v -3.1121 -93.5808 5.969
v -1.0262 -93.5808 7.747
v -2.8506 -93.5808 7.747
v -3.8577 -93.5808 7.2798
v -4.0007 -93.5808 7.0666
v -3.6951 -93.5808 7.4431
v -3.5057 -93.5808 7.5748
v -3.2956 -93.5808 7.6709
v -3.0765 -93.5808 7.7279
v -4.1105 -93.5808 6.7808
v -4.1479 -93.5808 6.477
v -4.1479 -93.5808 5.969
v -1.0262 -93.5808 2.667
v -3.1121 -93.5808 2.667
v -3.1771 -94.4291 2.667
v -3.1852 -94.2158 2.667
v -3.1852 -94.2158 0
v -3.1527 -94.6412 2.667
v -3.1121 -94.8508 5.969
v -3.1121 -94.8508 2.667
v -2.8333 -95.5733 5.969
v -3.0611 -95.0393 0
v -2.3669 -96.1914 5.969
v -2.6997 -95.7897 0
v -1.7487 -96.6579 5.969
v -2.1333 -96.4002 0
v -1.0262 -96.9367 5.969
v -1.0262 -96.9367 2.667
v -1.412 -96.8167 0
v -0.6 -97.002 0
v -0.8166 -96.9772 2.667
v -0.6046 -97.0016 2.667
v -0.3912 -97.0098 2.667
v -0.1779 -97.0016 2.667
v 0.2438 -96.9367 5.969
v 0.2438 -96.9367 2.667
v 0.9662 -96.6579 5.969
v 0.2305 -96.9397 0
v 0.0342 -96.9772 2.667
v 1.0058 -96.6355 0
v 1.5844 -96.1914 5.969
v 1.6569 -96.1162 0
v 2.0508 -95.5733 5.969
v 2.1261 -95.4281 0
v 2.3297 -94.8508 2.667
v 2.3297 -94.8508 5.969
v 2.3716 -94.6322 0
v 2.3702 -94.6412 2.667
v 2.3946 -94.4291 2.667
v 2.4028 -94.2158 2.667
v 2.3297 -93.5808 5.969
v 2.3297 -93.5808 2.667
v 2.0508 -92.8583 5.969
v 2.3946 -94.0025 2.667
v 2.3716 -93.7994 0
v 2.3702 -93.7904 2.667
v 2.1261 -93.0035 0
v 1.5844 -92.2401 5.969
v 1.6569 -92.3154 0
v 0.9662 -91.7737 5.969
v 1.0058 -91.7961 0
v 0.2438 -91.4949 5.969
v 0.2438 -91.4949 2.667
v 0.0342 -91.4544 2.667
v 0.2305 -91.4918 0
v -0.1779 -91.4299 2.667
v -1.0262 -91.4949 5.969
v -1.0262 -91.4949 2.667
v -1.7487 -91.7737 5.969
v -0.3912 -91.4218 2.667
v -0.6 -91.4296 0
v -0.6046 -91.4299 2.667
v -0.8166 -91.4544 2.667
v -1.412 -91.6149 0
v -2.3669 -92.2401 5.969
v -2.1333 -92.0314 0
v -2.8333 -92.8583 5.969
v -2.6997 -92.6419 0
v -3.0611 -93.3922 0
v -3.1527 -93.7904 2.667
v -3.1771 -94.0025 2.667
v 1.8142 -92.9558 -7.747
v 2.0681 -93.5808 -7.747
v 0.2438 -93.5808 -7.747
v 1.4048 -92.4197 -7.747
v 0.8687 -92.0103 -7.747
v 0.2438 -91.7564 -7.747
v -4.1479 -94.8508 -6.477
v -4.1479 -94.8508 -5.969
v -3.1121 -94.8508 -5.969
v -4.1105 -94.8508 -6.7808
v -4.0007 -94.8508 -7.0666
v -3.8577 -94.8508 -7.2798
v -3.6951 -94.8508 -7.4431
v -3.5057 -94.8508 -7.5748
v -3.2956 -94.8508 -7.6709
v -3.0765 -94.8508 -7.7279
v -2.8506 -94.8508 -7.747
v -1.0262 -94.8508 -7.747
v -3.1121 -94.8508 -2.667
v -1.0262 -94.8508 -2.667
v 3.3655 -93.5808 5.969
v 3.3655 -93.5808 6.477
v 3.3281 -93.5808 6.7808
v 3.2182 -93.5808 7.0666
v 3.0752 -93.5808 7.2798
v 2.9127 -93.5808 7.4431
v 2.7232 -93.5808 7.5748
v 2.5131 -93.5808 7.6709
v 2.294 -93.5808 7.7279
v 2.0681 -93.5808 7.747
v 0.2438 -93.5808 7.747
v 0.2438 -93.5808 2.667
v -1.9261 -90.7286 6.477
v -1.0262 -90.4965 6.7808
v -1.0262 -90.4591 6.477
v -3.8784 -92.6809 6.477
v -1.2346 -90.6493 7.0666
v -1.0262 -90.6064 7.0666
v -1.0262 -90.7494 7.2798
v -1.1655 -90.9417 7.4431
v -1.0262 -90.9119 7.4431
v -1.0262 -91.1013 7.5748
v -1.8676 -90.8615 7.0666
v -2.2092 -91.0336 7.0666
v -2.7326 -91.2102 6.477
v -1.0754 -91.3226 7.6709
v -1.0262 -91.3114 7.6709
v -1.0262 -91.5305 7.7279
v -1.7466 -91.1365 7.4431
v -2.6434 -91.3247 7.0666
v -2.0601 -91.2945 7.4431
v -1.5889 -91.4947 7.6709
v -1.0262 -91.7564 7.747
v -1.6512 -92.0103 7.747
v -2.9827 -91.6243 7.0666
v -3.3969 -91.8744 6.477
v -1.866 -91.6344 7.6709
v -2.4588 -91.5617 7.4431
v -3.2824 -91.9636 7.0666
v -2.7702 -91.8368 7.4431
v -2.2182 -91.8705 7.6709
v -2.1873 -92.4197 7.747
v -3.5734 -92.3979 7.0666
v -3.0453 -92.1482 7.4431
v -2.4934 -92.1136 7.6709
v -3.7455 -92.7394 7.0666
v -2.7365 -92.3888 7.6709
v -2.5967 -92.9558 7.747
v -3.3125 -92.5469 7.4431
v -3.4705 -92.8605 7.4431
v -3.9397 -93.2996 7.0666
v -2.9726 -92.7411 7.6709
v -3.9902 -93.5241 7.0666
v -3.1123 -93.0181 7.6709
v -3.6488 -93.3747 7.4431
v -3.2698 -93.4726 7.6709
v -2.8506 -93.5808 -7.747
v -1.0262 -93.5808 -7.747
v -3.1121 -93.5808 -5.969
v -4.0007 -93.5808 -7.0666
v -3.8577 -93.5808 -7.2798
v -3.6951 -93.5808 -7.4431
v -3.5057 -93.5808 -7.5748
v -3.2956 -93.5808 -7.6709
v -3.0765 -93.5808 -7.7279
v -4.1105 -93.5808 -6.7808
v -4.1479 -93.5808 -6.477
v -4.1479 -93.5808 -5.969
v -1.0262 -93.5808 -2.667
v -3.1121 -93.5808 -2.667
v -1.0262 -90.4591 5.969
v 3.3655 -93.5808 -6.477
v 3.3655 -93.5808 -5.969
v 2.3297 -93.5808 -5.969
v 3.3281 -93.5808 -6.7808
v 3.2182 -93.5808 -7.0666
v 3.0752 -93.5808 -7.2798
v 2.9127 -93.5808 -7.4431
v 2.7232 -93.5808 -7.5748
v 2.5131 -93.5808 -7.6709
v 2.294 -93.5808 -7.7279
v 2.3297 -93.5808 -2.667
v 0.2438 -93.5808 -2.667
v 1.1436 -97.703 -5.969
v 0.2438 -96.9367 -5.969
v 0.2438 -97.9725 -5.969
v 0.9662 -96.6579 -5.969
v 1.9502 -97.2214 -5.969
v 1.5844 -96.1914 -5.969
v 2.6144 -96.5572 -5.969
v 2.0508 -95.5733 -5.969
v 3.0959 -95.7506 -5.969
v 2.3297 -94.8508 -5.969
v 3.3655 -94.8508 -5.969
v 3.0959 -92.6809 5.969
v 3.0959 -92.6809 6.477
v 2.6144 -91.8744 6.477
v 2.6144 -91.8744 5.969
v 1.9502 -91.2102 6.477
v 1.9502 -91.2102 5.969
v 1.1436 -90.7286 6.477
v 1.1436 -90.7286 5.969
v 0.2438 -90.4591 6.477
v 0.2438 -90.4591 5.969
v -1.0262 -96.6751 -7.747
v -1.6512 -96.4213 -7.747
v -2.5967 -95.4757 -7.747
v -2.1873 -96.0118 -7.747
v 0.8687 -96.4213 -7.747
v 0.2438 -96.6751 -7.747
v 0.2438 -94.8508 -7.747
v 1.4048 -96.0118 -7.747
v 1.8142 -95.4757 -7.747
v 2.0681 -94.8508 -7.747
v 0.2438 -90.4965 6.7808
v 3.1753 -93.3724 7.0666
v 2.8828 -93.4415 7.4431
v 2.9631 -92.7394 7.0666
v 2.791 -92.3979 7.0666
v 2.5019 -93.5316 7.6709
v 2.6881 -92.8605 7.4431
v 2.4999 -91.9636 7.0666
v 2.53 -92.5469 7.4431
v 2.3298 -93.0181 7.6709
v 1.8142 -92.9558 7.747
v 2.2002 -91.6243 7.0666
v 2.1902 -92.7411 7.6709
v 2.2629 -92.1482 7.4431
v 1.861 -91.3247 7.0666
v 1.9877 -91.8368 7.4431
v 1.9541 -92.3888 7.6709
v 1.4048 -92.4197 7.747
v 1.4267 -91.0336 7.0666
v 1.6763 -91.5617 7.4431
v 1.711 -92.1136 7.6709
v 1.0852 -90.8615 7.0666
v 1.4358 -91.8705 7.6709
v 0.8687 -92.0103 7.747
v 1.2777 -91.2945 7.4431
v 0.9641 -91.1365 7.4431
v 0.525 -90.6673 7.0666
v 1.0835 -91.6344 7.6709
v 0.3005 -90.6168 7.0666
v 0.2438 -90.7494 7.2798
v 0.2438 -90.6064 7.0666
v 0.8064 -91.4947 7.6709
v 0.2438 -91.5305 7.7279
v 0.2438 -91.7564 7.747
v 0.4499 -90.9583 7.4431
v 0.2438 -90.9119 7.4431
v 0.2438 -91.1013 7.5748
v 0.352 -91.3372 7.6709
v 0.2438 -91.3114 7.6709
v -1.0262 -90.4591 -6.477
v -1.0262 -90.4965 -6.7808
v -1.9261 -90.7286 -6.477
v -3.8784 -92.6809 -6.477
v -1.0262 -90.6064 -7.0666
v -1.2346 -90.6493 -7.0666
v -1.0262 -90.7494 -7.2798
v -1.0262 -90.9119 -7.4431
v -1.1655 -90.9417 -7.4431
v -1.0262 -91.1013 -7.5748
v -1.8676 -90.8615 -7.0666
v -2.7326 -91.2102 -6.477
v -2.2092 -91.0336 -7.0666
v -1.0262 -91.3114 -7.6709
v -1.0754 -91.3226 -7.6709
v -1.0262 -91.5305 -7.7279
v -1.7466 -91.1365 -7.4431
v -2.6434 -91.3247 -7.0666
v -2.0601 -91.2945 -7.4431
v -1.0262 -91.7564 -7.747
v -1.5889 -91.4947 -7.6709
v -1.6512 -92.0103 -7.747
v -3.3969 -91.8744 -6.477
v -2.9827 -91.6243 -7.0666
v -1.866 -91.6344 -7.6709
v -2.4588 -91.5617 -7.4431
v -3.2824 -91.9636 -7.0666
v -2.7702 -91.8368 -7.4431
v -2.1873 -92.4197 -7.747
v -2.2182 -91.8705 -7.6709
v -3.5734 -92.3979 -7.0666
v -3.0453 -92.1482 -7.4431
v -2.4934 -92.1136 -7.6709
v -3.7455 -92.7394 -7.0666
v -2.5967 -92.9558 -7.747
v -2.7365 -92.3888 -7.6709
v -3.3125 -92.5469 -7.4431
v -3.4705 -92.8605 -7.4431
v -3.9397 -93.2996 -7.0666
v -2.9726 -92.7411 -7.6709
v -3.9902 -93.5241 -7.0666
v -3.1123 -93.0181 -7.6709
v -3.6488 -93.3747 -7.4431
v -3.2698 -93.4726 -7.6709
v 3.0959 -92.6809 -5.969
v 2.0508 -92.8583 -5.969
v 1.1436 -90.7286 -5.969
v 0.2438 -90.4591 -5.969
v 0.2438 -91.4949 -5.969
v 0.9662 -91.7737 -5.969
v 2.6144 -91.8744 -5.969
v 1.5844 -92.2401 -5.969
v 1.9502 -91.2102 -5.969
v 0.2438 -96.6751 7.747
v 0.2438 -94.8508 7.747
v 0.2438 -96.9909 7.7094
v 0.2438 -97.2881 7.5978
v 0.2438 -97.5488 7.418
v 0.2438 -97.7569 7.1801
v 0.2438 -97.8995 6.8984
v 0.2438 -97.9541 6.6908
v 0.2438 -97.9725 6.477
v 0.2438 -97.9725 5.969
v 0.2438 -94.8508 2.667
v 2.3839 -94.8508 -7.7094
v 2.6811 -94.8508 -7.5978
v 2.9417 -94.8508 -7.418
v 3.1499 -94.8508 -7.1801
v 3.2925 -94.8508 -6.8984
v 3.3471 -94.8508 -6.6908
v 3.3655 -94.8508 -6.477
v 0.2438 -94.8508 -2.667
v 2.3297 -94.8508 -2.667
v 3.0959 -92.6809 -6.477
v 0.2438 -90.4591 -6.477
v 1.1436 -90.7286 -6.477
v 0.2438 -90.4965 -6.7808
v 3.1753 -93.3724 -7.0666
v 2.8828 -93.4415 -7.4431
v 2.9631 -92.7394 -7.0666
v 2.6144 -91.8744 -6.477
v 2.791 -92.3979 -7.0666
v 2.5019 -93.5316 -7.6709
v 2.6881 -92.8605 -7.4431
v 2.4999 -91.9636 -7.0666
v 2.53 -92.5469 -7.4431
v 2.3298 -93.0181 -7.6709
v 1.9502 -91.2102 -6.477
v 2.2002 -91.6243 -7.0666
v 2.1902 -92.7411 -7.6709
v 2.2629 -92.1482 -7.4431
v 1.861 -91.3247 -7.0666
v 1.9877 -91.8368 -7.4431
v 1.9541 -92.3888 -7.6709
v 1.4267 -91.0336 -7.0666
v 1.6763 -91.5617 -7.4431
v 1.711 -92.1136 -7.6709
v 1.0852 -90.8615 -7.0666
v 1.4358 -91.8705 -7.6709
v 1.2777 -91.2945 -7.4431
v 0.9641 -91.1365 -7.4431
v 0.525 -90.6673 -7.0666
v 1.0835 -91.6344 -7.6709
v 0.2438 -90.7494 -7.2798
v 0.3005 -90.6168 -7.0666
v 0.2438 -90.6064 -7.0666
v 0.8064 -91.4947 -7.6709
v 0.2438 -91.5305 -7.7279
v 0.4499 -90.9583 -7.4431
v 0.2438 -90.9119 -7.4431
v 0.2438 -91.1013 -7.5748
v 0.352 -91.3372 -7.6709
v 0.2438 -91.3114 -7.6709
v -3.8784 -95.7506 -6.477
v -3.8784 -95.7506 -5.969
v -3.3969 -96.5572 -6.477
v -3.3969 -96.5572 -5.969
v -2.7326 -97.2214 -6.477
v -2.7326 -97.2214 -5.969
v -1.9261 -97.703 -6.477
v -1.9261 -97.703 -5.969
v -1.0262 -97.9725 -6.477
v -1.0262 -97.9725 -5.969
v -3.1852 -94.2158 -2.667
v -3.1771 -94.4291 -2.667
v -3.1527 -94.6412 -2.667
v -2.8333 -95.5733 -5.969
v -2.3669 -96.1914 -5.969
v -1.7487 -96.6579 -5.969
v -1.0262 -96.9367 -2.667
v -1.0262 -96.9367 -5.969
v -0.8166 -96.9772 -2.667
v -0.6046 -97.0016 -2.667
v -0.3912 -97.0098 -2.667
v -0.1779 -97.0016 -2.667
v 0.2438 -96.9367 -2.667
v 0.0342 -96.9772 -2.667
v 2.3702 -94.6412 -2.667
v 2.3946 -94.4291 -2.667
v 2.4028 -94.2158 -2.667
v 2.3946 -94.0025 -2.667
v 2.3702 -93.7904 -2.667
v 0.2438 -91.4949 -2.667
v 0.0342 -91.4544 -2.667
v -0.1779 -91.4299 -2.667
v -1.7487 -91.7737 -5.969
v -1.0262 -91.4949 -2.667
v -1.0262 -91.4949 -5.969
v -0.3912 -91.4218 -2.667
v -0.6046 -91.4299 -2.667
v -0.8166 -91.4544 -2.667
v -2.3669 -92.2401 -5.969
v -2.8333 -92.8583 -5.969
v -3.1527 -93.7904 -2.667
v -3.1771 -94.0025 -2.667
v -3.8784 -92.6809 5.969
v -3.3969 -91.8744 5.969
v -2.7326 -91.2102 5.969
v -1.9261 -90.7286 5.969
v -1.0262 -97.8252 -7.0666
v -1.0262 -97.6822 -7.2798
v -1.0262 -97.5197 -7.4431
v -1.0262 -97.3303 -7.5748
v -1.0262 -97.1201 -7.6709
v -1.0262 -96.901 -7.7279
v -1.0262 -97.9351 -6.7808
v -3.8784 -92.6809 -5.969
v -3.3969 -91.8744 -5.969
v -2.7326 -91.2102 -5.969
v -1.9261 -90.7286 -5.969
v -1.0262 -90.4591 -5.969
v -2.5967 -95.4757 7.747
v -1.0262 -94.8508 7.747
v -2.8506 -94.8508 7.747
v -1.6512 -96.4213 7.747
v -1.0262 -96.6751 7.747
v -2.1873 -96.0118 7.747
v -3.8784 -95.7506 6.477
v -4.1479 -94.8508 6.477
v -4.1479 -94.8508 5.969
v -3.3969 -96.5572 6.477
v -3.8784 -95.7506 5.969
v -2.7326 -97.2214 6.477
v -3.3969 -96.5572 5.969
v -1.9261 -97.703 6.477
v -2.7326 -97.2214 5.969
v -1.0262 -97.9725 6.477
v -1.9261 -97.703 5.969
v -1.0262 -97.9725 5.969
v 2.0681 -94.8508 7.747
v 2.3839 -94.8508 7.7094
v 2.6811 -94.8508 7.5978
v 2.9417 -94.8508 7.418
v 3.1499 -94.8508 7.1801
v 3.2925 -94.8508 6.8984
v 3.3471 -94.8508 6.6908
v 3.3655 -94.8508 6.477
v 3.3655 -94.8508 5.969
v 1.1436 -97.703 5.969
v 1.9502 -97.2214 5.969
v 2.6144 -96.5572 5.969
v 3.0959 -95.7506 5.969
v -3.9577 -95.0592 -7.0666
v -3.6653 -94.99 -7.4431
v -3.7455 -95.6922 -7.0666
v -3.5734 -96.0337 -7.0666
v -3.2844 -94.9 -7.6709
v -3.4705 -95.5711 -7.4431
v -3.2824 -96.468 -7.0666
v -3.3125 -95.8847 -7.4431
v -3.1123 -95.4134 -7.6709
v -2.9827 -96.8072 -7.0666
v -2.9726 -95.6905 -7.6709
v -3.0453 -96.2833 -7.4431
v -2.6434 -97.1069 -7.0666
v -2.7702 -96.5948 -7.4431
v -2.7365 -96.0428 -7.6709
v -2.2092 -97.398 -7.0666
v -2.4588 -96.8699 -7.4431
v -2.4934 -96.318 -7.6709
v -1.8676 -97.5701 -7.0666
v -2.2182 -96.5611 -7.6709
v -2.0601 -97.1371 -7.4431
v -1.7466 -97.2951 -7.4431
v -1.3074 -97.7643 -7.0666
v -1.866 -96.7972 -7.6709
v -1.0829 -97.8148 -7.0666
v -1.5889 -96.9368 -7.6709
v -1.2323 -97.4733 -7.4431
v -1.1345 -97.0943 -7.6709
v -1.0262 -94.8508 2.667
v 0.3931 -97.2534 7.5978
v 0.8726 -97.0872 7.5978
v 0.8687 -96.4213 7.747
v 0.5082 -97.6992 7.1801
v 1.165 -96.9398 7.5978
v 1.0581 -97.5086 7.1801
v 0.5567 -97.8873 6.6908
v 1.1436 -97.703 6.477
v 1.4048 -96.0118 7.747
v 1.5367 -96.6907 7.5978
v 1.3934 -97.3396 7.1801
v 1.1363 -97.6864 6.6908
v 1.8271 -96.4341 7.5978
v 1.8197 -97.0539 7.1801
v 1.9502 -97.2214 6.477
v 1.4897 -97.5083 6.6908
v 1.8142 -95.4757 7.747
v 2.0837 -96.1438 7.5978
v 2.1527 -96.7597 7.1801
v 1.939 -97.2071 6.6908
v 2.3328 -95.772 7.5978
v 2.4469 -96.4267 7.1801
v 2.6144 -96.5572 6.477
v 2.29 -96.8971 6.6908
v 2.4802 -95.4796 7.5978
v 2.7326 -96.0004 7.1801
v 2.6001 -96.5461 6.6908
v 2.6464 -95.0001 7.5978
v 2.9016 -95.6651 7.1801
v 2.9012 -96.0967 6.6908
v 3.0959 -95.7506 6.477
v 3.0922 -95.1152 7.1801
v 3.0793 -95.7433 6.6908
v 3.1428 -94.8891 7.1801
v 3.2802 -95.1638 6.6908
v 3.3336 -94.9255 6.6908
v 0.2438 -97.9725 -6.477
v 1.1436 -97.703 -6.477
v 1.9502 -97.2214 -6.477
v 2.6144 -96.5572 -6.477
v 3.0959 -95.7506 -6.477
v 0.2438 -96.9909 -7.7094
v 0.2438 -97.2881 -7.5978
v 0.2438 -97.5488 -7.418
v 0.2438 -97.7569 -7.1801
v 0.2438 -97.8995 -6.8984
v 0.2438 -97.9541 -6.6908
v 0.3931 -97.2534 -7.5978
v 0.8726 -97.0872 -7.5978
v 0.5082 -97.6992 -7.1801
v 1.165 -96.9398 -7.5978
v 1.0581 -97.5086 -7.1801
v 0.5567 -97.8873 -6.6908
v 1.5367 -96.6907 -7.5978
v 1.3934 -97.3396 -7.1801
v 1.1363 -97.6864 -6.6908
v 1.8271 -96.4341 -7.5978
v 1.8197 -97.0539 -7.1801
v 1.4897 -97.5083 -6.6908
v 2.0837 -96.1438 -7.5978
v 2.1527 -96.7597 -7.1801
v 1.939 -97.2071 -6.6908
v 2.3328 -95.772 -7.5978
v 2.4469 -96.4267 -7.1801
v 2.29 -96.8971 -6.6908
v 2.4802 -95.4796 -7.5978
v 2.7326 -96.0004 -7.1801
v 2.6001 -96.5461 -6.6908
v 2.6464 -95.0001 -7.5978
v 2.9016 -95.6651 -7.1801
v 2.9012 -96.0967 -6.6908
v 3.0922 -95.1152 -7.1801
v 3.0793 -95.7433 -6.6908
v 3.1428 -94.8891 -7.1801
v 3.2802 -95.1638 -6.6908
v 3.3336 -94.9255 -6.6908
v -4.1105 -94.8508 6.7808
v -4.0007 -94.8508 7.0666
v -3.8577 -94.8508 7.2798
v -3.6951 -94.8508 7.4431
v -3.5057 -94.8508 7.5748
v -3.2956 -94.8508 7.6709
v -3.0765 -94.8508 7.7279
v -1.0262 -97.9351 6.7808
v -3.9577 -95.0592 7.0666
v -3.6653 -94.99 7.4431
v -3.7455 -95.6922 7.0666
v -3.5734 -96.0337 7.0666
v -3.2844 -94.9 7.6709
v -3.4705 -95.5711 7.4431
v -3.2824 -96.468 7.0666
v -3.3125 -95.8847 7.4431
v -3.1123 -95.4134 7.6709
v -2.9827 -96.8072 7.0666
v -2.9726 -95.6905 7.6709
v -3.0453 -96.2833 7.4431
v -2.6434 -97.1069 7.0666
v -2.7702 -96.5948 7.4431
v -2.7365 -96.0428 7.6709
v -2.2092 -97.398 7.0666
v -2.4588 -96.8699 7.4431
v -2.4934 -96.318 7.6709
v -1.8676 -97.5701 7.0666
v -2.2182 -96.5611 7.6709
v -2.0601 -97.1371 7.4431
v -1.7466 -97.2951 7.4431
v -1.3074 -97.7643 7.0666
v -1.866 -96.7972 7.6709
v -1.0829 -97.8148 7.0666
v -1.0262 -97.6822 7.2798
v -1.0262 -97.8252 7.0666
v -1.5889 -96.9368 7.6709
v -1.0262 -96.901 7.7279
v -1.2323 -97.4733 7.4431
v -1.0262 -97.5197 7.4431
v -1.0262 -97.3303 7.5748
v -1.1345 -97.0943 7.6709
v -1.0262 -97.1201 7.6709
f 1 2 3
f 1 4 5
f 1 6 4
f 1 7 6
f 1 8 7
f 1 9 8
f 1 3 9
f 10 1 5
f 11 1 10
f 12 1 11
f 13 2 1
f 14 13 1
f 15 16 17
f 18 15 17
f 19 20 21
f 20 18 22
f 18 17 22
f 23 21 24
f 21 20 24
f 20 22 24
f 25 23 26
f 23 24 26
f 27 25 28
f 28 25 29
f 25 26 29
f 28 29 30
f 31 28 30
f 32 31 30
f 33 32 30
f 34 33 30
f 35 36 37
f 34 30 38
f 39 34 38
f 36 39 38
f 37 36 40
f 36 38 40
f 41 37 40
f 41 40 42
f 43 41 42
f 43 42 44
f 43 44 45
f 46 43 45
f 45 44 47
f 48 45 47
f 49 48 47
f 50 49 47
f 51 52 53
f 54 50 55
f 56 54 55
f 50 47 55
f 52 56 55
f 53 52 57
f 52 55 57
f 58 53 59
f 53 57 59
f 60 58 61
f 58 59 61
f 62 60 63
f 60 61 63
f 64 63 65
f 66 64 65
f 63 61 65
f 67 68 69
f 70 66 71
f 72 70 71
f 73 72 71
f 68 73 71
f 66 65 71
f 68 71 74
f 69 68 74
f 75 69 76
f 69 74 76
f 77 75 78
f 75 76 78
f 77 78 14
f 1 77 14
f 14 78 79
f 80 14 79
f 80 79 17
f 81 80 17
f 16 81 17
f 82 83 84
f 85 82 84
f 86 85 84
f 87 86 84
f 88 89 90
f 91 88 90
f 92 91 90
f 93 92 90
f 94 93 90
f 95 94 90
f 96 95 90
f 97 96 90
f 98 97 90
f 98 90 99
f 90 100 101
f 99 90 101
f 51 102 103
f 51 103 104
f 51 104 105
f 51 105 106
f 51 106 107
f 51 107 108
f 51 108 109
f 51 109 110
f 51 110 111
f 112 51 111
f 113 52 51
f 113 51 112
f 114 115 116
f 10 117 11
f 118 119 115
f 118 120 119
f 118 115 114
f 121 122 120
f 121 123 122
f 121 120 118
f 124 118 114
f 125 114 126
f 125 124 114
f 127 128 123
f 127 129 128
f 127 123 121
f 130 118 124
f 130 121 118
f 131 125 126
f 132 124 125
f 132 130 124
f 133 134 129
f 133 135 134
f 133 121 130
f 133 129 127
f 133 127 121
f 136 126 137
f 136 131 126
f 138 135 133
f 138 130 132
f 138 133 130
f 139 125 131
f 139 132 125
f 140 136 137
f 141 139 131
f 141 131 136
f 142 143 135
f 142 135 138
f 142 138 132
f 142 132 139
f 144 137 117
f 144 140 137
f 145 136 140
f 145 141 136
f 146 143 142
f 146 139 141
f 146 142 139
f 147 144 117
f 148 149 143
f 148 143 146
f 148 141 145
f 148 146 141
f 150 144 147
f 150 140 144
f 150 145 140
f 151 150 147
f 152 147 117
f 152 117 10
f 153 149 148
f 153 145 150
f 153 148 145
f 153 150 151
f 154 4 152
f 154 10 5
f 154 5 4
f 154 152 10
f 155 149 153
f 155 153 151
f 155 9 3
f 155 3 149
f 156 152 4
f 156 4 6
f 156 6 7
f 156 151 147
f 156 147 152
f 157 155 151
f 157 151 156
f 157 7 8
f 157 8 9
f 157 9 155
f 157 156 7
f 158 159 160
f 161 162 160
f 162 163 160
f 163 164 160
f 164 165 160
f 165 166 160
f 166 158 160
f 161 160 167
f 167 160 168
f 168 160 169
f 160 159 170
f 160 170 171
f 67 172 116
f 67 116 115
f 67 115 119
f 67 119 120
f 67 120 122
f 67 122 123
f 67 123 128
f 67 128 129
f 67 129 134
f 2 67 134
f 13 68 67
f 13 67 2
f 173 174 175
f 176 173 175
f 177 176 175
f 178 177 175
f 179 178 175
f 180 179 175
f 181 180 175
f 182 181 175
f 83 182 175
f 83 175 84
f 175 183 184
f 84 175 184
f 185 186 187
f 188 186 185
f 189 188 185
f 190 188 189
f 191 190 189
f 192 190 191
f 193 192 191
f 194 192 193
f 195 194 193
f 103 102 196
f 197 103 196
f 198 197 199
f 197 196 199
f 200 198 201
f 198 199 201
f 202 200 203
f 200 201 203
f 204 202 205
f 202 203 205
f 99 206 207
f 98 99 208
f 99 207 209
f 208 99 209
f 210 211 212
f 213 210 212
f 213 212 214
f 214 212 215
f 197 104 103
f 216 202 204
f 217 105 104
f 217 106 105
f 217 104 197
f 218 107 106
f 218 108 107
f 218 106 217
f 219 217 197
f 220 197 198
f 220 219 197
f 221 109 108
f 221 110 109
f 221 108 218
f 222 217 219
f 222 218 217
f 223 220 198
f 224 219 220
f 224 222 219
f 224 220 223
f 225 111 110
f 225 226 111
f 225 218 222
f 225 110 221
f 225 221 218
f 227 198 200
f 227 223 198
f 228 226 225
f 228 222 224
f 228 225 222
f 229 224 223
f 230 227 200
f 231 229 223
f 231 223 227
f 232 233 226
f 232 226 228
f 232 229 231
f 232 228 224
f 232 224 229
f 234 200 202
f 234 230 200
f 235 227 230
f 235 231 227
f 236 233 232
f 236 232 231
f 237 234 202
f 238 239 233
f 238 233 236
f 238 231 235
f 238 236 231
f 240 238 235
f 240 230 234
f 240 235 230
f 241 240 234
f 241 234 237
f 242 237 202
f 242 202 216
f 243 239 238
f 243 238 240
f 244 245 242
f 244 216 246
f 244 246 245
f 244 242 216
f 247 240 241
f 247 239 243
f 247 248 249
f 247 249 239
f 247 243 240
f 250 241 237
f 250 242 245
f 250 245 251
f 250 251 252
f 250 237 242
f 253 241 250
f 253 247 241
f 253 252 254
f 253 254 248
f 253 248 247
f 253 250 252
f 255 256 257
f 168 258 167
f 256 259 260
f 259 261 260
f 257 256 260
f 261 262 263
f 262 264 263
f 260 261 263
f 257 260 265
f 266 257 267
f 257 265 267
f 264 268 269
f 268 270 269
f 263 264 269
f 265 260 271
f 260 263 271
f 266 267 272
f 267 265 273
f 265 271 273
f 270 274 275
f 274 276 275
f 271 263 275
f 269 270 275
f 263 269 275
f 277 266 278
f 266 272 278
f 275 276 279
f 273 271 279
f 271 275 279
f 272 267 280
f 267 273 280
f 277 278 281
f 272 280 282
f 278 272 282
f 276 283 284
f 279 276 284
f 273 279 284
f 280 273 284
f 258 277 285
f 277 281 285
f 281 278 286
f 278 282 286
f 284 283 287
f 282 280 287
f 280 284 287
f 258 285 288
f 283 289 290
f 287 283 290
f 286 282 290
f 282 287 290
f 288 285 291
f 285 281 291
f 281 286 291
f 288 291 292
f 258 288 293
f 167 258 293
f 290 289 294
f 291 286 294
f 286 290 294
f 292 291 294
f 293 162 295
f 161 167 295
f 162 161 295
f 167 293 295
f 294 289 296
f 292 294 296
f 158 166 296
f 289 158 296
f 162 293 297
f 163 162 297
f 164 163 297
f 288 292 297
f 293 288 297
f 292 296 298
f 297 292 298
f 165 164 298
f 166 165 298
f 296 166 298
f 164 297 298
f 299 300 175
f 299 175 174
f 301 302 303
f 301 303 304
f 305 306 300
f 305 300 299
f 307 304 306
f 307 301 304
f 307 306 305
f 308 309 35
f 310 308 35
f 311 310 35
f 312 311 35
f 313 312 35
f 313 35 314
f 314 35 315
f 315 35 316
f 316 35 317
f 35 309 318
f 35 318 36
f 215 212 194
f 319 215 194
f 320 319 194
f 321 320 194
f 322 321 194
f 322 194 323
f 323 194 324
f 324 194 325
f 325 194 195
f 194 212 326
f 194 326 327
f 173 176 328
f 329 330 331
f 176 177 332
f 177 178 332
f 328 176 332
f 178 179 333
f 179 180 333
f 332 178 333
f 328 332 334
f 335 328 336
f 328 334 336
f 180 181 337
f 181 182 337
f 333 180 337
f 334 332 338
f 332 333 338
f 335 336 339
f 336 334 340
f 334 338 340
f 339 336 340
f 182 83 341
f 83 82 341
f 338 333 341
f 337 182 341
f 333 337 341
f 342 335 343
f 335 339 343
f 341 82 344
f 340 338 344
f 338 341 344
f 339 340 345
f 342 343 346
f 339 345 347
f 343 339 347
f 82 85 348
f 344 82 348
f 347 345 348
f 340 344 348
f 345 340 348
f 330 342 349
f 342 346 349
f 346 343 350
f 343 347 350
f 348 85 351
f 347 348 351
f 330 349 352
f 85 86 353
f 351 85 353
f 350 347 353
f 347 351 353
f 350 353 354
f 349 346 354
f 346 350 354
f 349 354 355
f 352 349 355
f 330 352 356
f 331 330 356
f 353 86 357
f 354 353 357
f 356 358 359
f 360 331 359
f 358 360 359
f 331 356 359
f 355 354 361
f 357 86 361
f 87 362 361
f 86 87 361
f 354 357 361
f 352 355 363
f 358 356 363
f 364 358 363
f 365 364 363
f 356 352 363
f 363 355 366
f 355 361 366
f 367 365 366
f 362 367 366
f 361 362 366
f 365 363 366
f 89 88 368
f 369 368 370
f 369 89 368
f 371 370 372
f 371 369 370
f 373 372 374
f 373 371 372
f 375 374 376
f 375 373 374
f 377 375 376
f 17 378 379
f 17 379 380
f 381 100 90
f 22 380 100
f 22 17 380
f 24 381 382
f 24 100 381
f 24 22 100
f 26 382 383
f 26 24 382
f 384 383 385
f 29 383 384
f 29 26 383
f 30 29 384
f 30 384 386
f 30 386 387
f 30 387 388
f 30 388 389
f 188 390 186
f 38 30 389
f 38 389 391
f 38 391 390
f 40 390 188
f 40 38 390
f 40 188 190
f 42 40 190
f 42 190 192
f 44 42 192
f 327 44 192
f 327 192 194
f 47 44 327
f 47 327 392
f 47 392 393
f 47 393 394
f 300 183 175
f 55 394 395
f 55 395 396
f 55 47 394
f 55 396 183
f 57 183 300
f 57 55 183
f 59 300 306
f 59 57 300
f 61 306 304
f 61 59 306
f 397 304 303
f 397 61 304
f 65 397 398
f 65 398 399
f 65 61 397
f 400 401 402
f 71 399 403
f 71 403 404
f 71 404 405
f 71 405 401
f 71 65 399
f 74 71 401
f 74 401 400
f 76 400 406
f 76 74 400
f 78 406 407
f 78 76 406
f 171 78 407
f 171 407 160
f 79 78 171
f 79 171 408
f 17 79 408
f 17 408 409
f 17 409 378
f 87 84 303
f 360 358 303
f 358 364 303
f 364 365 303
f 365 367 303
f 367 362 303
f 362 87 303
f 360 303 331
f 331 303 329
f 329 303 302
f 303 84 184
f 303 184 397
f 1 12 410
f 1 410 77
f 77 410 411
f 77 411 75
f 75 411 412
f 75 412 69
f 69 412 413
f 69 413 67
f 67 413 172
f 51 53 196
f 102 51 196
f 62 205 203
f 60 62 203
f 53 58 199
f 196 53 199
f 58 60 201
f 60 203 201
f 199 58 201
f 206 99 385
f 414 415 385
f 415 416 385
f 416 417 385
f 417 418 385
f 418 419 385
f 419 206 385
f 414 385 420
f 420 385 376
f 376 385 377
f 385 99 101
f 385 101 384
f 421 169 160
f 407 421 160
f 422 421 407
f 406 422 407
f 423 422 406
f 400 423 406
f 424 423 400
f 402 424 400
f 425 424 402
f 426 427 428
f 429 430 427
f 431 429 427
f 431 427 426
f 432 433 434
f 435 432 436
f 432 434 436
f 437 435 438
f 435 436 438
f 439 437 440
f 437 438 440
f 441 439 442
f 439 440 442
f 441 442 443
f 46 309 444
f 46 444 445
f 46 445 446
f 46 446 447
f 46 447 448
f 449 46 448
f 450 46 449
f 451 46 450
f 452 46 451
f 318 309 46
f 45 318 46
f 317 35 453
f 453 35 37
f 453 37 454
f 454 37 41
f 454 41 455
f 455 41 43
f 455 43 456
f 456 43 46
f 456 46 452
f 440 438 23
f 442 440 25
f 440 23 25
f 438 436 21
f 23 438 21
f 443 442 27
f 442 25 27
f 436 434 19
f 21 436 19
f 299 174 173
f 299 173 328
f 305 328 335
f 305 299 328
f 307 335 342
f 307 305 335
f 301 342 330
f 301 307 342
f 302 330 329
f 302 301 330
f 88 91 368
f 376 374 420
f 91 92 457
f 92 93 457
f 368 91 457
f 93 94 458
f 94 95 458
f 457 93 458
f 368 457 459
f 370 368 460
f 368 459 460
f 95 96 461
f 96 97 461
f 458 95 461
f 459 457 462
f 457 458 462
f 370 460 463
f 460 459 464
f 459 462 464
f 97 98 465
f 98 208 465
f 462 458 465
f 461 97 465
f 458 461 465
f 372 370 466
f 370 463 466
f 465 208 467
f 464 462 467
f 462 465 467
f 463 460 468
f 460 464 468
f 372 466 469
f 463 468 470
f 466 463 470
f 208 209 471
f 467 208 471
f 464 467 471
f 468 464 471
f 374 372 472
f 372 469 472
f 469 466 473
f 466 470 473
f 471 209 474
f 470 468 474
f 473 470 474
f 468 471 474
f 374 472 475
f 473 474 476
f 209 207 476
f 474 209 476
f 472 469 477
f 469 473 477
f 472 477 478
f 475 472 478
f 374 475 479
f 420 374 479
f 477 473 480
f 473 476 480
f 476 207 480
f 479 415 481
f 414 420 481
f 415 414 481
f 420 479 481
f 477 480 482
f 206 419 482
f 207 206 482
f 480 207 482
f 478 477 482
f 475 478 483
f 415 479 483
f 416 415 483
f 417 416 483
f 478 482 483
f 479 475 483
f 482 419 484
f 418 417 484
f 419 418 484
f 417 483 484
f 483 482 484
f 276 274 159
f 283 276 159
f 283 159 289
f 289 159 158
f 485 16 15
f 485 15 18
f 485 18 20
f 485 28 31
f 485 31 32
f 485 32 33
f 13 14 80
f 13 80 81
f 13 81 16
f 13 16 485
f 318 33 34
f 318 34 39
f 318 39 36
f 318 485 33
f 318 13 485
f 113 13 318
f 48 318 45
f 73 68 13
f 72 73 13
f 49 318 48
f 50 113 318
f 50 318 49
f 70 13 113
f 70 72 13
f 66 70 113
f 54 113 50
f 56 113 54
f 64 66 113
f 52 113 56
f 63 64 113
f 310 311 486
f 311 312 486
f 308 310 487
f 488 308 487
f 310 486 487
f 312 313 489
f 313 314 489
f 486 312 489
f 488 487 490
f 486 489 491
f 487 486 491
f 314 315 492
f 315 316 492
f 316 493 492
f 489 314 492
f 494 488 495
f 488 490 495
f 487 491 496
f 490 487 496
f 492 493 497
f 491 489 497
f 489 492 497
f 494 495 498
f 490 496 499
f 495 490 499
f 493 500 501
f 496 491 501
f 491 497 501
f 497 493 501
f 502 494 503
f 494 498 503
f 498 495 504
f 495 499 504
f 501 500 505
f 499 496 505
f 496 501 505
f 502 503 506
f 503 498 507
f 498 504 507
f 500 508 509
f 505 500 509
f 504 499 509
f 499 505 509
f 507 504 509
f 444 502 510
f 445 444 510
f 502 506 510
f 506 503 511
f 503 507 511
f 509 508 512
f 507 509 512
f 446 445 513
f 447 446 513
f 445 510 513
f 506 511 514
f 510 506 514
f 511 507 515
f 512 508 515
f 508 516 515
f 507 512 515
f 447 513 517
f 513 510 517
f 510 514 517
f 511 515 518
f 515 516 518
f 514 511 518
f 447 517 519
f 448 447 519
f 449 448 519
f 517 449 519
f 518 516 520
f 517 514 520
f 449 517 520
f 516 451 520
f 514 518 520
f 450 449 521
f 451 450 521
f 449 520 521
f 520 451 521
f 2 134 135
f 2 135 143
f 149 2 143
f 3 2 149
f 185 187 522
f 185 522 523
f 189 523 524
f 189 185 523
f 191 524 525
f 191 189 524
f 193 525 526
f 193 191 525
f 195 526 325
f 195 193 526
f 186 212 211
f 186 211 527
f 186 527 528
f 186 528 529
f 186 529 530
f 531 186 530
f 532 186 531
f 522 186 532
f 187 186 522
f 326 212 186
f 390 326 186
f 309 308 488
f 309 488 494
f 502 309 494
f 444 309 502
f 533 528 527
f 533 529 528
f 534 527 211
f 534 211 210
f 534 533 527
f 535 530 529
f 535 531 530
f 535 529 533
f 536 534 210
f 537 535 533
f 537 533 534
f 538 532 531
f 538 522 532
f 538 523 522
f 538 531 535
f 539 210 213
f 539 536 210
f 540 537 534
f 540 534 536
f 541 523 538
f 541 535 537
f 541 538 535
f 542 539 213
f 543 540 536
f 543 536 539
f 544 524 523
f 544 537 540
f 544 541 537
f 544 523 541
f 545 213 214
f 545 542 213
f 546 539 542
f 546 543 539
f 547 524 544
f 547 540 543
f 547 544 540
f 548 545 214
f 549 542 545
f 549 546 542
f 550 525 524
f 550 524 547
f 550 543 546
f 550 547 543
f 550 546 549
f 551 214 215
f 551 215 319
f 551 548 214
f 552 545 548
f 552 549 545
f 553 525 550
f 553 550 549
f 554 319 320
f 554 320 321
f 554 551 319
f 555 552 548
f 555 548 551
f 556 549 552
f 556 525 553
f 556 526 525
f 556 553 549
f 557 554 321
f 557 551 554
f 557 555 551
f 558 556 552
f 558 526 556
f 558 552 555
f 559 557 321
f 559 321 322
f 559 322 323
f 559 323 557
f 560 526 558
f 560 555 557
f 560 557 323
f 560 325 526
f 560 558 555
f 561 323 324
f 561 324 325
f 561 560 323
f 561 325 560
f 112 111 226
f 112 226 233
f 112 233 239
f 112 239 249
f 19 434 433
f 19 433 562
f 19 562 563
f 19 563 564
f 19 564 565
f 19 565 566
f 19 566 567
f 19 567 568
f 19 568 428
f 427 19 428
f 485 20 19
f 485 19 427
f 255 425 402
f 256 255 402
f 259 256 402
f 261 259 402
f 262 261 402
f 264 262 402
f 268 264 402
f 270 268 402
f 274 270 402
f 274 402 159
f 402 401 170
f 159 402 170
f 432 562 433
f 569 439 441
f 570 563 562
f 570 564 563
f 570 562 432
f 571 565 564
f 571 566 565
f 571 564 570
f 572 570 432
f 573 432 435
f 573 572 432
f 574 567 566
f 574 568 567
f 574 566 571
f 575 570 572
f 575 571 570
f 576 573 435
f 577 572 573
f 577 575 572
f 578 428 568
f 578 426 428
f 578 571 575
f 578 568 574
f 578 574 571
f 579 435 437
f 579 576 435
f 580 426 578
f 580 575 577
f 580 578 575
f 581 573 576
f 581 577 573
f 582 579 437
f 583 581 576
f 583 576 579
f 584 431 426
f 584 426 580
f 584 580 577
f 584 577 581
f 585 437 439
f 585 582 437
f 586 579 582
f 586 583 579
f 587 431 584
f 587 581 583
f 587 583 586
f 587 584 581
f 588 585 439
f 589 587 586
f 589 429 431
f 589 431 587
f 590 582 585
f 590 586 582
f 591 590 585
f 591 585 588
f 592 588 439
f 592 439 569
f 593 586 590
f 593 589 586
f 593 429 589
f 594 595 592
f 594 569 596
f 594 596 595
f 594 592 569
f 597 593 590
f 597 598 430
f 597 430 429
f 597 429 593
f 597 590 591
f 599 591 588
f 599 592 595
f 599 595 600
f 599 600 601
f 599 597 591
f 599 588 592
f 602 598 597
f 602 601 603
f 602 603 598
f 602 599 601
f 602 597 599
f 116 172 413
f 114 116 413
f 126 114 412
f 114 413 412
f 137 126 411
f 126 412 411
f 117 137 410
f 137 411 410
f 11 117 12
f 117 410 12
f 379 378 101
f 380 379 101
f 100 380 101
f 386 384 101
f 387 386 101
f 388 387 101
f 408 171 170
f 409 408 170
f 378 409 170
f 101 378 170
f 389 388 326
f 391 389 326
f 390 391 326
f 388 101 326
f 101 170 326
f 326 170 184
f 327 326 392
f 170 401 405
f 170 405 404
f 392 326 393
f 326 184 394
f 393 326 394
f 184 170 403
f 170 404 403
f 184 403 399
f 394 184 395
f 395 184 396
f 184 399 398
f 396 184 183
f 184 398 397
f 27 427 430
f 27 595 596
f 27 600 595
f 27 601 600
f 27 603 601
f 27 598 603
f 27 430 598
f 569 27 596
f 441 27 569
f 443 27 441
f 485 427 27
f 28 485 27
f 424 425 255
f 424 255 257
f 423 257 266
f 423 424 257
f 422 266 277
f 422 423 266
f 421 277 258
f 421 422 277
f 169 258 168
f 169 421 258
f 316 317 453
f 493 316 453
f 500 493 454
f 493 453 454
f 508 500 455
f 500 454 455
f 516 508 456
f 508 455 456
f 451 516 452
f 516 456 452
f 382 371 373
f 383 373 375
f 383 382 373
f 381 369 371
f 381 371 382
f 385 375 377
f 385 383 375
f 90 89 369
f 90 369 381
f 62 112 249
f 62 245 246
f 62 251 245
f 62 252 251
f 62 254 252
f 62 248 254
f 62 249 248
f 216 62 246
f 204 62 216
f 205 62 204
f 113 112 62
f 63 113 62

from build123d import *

# Parameters (mm, degrees)
SKETCH1_R           = 2.794
BOSS_EXTRUDE1_DEPTH = 7.747
CUT_EXTRUDE1_START  = -5.08
SKETCH2_W           = 1.27
SKETCH2_H           = 1.27
CUT_EXTRUDE1_DEPTH  = 5.08
BOSS_EXTRUDE2_START = -1.778
BOSS_EXTRUDE2_DEPTH = 1.778
FILLET1_R           = 1.27


with BuildPart() as part:
    # Sketch1 → Boss-Extrude1 (new body)
    with BuildSketch(Plane.XY):
        with Locations(Location((-0.391227277, -94.215792273, 0), (0, 0, 180))):
            Circle(SKETCH1_R)
    extrude(amount=BOSS_EXTRUDE1_DEPTH)

    # Sketch2 → Cut-Extrude1 (cut)
    with BuildSketch(Plane.XY.offset(7.747).offset(CUT_EXTRUDE1_START)):
        with BuildLine():
            ThreePointArc((2.402772723, -94.215792273), (2.384433594, -93.896194512), (2.329656954, -93.580792273))
            Line((2.329656954, -93.580792273), (0.243772723, -93.580792273))
            Line((0.243772723, -93.580792273), (0.243772723, -94.850792273))
            Line((0.243772723, -94.850792273), (2.329656954, -94.850792273))
            ThreePointArc((2.329656954, -94.850792273), (2.384433594, -94.535390034), (2.402772723, -94.215792273))
        make_face()
        with BuildLine():
            Line((-1.026227277, -94.850792273), (-1.026227277, -93.580792273))
            Line((-1.026227277, -93.580792273), (-3.112111508, -93.580792273))
            ThreePointArc((-3.112111508, -93.580792273), (-3.166888148, -93.896194512), (-3.185227277, -94.215792273))
            ThreePointArc((-3.185227277, -94.215792273), (-3.166888148, -94.535390034), (-3.112111508, -94.850792273))
            Line((-3.112111508, -94.850792273), (-1.026227277, -94.850792273))
        make_face()
        with BuildLine():
            Line((-1.026227277, -93.580792273), (0.243772723, -93.580792273))
            Line((0.243772723, -93.580792273), (0.243772723, -91.494908041))
            ThreePointArc((0.243772723, -91.494908041), (-0.071629516, -91.440131402), (-0.391227277, -91.421792273))
            ThreePointArc((-0.391227277, -91.421792273), (-0.710825038, -91.440131402), (-1.026227277, -91.494908041))
            Line((-1.026227277, -91.494908041), (-1.026227277, -93.580792273))
        make_face()
        with BuildLine():
            Line((0.243772723, -96.936676504), (0.243772723, -94.850792273))
            Line((0.243772723, -94.850792273), (-1.026227277, -94.850792273))
            Line((-1.026227277, -94.850792273), (-1.026227277, -96.936676504))
            ThreePointArc((-1.026227277, -96.936676504), (-0.71082509, -96.991453138), (-0.391227382, -97.009792273))
            ThreePointArc((-0.391227382, -97.009792273), (-0.071629568, -96.99145315), (0.243772723, -96.936676504))
        make_face()
        with Locations((-0.391227277, -94.215792273)):
            Rectangle(SKETCH2_W, SKETCH2_H)
    extrude(amount=CUT_EXTRUDE1_DEPTH, mode=Mode.SUBTRACT)

    # Sketch3 → Boss-Extrude2 (add)
    with BuildSketch(Plane.XY.offset(7.747).offset(BOSS_EXTRUDE2_START)):
        with BuildLine():
            Line((0.243772723, -96.936676504), (0.243772723, -97.972502935))
            ThreePointArc((0.243772723, -97.972502935), (2.302849559, -96.909869109), (3.365483385, -94.850792273))
            Line((3.365483385, -94.850792273), (2.329656954, -94.850792273))
            ThreePointArc((2.329656954, -94.850792273), (1.58442907, -96.191448619), (0.243772723, -96.936676504))
        make_face()
        with BuildLine():
            Line((-1.026227277, -97.972502935), (-1.026227277, -96.936676504))
            ThreePointArc((-1.026227277, -96.936676504), (-2.366883624, -96.191448619), (-3.112111508, -94.850792273))
            Line((-3.112111508, -94.850792273), (-4.147937939, -94.850792273))
            ThreePointArc((-4.147937939, -94.850792273), (-3.085304113, -96.909869109), (-1.026227277, -97.972502935))
        make_face()
        with BuildLine():
            Line((-4.147937939, -93.580792273), (-3.112111508, -93.580792273))
            ThreePointArc((-3.112111508, -93.580792273), (-2.366883624, -92.240135926), (-1.026227277, -91.494908041))
            Line((-1.026227277, -91.494908041), (-1.026227277, -90.45908161))
            ThreePointArc((-1.026227277, -90.45908161), (-3.085304113, -91.521715436), (-4.147937939, -93.580792273))
        make_face()
        with BuildLine():
            Line((0.243772723, -90.45908161), (0.243772723, -91.494908041))
            ThreePointArc((0.243772723, -91.494908041), (1.58442907, -92.240135926), (2.329656954, -93.580792273))
            Line((2.329656954, -93.580792273), (3.365483385, -93.580792273))
            ThreePointArc((3.365483385, -93.580792273), (2.302849559, -91.521715436), (0.243772723, -90.45908161))
        make_face()
    extrude(amount=BOSS_EXTRUDE2_DEPTH)

    # Fillet1
    fillet1_edges = [part.edges().sort_by_distance(p)[0] for p in [
        (2.302849559, -96.909869109, 7.747),
        (-3.085304113, -96.909869109, 7.747),
        (-3.085304113, -91.521715436, 7.747),
        (2.302849559, -91.521715436, 7.747),
    ]]
    fillet(fillet1_edges, radius=FILLET1_R)

    # Mirror2: part across plane


with BuildPart() as part_1:
    add(part.part)
    add(part.part.mirror(Plane(origin=(-0.391227277, -94.215792273, 0), x_dir=(1, 0, 0), z_dir=(0, 0, 1))))


solid = part_1.part
